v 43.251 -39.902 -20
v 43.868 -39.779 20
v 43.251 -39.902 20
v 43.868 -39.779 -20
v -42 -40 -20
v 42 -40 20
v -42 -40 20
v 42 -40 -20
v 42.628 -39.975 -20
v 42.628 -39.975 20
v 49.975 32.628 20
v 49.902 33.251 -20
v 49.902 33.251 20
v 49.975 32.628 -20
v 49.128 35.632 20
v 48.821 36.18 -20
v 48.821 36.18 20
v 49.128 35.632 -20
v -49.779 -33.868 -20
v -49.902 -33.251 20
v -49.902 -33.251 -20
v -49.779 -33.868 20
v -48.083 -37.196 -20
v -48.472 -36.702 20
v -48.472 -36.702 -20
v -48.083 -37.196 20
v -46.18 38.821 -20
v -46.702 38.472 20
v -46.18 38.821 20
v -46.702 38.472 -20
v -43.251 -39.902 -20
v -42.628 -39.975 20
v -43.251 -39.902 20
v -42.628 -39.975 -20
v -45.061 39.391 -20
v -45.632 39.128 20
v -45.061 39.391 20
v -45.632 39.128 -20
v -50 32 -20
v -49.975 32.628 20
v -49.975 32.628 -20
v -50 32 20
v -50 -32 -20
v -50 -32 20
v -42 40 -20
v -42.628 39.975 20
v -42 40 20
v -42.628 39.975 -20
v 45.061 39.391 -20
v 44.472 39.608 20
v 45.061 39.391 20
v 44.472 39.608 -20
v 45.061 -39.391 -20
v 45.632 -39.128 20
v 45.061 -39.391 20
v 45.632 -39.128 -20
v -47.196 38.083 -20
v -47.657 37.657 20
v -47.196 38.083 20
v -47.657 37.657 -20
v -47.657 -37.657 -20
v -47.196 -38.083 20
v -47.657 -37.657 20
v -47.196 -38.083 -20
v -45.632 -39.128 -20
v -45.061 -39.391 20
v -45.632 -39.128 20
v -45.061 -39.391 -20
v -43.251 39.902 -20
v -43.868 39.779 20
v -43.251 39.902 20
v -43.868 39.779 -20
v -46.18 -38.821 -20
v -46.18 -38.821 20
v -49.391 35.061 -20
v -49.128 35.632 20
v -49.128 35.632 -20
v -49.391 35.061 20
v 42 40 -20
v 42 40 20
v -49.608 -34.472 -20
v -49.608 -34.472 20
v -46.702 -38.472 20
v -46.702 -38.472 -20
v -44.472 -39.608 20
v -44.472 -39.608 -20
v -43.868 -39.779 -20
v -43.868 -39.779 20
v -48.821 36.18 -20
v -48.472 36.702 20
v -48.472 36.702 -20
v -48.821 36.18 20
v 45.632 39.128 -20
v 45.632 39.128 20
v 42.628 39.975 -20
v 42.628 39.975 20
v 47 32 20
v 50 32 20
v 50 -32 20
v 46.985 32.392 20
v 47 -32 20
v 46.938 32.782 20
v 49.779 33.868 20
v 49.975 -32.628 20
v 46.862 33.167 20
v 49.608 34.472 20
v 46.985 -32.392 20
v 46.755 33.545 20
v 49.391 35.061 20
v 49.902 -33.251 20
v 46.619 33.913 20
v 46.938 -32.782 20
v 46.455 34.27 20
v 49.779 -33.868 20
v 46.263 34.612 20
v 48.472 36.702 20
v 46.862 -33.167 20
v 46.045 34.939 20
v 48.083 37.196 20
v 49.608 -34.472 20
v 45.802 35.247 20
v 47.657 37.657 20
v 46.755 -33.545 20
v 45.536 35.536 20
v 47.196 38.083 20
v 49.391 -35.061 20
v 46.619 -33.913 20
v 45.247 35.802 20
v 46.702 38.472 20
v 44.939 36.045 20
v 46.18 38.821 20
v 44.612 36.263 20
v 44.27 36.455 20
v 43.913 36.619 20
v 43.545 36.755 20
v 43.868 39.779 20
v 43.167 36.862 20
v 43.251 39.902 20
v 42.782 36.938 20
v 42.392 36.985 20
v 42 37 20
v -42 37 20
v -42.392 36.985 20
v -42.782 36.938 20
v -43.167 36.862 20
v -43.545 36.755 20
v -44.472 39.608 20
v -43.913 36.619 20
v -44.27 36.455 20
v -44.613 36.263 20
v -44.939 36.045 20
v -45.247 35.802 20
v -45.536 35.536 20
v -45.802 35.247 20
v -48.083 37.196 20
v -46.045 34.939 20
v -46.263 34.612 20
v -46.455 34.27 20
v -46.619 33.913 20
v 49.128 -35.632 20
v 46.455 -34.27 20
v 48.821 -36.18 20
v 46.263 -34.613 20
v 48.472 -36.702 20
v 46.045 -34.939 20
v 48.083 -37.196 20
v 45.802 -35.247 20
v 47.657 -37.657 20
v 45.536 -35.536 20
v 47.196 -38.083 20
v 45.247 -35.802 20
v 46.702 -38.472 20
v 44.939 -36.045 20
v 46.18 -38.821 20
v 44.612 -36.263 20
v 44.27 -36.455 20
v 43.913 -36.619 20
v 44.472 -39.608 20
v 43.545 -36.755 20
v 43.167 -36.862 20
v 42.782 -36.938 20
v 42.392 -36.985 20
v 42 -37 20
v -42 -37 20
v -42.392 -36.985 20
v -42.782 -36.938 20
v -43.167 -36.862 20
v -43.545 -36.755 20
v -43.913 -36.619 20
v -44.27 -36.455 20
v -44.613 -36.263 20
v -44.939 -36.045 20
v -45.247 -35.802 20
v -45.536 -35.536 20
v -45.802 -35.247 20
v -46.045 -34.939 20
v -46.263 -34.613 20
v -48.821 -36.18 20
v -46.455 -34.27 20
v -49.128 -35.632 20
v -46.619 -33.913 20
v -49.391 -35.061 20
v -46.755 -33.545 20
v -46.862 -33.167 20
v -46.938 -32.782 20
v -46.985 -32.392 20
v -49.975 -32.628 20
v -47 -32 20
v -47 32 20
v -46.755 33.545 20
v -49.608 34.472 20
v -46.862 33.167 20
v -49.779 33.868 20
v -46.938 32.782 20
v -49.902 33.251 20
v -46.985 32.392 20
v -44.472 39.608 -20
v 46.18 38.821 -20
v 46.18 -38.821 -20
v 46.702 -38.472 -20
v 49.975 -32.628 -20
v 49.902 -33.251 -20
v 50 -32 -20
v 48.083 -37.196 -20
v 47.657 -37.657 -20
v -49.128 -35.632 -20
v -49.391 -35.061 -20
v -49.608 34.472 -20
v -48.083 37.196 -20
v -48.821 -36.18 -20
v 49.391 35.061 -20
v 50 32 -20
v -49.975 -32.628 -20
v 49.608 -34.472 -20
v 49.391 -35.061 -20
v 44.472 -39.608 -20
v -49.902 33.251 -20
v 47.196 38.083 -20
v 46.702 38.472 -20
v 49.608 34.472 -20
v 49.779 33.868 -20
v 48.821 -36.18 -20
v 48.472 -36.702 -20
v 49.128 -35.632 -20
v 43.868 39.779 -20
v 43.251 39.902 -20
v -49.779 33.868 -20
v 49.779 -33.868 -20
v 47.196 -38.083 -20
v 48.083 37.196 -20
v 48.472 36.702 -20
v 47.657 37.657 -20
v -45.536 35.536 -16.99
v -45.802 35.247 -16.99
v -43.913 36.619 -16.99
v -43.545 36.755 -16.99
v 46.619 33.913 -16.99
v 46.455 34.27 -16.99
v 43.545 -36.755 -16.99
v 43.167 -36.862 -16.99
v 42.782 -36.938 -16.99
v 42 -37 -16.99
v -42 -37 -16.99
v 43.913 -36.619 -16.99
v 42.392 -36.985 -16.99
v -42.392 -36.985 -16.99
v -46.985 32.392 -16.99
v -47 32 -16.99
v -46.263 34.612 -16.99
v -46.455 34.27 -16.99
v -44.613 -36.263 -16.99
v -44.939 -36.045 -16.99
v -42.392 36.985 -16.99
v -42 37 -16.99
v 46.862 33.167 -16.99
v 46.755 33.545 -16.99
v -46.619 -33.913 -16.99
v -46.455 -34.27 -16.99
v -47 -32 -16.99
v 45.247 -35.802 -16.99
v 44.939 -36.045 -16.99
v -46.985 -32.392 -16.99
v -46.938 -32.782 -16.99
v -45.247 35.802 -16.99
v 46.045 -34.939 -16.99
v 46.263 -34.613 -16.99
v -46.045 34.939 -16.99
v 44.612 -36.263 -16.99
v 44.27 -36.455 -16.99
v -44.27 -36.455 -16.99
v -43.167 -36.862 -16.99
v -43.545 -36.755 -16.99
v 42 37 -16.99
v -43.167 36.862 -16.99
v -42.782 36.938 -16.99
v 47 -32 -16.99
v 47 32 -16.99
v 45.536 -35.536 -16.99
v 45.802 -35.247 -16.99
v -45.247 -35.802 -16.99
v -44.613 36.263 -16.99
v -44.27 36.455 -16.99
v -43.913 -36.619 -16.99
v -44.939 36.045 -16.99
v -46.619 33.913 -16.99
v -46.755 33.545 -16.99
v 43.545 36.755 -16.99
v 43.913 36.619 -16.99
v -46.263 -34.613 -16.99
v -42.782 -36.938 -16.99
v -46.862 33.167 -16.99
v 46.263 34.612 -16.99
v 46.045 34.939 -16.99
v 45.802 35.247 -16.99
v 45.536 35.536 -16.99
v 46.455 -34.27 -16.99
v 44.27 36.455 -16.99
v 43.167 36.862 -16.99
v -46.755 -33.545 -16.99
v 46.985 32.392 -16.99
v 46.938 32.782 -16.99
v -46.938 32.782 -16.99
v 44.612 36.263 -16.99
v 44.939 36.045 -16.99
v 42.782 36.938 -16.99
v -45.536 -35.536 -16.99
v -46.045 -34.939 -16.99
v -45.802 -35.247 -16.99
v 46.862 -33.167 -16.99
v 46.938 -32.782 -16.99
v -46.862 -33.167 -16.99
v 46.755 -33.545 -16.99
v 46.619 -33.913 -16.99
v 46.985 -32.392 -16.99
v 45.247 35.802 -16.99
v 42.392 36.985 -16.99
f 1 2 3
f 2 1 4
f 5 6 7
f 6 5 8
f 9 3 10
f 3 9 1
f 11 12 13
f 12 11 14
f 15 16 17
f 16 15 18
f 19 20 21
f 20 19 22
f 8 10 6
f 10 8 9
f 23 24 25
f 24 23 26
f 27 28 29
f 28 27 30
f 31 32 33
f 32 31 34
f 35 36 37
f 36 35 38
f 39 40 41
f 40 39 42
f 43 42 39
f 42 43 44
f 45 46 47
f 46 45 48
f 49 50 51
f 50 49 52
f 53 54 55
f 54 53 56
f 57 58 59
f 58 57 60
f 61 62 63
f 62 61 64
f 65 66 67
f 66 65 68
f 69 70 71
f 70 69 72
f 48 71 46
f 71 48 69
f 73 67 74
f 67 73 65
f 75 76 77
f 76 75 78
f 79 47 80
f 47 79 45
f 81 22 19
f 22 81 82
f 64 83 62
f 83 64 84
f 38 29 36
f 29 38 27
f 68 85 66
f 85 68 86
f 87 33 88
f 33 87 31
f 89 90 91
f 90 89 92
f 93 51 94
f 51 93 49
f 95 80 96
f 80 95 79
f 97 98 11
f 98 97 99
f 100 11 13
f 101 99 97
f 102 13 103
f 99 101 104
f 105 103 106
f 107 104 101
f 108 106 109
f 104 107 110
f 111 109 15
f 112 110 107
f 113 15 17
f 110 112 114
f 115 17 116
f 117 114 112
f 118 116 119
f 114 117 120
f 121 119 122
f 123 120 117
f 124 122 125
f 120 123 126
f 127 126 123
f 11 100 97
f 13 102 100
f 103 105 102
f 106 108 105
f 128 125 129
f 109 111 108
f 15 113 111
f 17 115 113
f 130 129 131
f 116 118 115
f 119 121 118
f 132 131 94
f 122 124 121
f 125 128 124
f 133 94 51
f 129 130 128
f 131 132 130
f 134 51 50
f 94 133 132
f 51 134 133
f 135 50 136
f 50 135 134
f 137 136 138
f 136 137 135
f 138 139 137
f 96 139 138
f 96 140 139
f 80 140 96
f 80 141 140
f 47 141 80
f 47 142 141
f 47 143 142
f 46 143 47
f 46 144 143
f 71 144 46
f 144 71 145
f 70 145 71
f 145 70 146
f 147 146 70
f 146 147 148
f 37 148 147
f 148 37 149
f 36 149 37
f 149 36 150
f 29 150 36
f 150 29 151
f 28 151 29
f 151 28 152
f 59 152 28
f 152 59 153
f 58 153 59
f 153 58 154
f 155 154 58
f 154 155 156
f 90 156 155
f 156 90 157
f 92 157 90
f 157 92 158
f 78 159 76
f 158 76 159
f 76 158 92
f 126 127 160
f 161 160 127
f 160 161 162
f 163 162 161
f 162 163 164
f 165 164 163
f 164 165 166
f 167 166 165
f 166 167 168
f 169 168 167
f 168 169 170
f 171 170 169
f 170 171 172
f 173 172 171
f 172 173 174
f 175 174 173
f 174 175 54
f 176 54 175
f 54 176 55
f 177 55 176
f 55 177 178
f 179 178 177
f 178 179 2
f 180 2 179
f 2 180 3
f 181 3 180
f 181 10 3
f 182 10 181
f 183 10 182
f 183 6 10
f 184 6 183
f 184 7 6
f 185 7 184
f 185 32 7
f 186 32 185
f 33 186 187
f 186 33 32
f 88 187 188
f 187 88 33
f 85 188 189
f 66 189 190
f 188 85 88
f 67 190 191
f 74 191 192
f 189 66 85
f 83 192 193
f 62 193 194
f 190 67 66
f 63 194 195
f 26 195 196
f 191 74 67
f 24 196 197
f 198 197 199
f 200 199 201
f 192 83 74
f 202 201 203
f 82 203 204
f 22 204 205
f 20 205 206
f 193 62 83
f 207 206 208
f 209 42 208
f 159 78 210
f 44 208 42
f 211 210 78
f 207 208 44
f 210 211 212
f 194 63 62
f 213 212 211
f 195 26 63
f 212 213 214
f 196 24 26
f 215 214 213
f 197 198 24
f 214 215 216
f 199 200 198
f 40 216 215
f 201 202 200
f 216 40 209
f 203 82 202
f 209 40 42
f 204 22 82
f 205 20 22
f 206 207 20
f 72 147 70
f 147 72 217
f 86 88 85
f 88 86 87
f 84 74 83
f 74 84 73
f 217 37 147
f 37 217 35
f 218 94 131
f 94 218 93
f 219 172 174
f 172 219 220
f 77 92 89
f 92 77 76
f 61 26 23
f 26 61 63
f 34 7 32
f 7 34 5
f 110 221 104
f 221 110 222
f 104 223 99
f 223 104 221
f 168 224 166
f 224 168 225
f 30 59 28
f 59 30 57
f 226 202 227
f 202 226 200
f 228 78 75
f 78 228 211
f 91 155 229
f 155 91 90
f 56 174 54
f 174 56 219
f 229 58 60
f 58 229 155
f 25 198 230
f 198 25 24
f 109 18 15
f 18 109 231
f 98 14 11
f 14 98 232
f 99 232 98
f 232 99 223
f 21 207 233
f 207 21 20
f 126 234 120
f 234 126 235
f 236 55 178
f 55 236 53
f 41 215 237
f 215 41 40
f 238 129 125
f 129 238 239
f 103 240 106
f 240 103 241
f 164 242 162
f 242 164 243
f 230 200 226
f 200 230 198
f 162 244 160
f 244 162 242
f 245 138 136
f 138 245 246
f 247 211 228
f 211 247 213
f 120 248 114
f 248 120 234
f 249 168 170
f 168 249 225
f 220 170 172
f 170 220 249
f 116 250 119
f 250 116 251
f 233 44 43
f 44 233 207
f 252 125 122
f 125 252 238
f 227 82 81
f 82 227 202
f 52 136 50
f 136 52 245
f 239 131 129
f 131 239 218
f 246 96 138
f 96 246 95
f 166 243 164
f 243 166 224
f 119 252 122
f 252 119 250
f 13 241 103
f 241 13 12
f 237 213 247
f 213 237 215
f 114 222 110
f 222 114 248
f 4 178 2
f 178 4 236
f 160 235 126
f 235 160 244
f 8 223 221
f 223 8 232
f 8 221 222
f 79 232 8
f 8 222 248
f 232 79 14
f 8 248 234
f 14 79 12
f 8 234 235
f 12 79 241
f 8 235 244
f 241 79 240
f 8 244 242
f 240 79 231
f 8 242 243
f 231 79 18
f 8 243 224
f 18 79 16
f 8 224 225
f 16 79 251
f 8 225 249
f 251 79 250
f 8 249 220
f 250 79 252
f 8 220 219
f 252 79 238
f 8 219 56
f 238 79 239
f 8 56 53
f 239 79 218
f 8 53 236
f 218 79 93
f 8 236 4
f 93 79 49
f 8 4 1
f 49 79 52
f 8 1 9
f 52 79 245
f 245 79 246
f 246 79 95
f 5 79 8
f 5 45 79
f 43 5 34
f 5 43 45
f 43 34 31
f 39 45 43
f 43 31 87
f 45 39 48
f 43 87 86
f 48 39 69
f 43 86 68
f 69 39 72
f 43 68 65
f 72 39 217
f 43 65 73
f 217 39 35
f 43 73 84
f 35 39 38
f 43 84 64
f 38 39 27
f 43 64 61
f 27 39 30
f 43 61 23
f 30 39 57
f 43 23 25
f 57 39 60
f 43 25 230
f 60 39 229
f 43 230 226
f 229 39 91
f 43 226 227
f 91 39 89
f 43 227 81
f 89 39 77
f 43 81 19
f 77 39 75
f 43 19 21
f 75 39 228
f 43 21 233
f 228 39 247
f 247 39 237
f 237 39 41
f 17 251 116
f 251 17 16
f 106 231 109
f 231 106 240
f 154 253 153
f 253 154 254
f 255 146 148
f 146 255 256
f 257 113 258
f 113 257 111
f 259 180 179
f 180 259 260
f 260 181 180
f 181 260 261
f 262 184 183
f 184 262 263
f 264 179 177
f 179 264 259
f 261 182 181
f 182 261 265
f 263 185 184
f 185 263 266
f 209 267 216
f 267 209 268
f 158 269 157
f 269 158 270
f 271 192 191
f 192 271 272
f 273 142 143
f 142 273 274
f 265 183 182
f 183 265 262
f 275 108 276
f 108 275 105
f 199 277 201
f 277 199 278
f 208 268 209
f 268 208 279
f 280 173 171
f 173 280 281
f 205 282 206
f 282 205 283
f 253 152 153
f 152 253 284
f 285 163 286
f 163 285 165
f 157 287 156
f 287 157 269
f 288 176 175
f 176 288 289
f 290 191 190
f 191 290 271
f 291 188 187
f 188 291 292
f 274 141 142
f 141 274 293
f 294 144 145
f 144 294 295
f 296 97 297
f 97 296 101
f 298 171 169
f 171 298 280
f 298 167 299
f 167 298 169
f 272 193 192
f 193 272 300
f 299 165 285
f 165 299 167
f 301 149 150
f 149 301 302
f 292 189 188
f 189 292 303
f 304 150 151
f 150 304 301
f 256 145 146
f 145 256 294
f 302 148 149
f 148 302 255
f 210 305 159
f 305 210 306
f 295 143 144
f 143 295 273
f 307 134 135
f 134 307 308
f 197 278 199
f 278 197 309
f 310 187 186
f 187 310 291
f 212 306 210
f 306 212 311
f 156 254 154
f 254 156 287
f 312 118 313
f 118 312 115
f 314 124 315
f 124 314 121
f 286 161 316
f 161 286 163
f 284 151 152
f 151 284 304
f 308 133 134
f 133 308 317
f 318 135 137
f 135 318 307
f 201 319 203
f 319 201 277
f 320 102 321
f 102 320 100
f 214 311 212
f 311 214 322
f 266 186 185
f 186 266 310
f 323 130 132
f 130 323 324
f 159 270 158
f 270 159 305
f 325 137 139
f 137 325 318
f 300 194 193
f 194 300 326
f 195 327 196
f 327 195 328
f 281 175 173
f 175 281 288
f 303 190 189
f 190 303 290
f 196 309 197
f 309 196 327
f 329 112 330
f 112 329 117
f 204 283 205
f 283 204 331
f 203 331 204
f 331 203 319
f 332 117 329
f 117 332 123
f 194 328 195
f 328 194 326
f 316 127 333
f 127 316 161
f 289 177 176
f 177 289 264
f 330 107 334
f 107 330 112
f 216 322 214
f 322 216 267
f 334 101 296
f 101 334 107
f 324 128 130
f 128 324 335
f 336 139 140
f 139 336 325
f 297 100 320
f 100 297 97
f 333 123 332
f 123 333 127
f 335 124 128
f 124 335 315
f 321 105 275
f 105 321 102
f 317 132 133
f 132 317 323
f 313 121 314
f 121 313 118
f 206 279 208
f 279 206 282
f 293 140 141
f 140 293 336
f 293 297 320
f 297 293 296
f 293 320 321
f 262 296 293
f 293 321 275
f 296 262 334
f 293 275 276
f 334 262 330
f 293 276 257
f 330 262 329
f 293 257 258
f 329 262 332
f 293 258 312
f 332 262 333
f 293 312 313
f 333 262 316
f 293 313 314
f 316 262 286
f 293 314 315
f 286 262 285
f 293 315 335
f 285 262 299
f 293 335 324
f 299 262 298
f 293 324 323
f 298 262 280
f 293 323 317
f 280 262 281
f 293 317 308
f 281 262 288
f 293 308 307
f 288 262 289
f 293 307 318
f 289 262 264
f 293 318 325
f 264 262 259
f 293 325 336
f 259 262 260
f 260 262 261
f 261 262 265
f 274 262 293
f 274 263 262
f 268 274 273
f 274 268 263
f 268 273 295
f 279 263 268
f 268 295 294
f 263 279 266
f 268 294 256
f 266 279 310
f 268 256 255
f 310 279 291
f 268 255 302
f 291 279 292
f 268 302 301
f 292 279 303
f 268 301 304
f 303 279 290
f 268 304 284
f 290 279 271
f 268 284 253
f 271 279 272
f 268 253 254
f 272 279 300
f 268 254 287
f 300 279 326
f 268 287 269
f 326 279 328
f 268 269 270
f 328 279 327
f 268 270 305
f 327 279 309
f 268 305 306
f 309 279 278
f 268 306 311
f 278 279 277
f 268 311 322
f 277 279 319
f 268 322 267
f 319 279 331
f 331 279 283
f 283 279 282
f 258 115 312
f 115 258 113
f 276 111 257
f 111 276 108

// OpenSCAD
// Start: lazy_union
default_5_default_5();
// End: lazy_union

// Modules.

// 'PartMaterial undef-default - default 5.0'
module default_5_default_5() {
  // 'None : _combine_solids_and_holes'
  union() {
    // '_combine_solids_and_holes'
    difference() {
      // 'default : _combine_solids_and_holes'
      union() {
        // 'outer : _combine_solids_and_holes'
        union() {
          // 'hull'
          multmatrix(m=[[1.0, 0.0, 0.0, -50.0], [0.0, 1.0, 0.0, -40.0], [0.0, 0.0, 1.0, -20.0], [0.0, 0.0, 0.0, 1.0]]) {
            // 'hull : _combine_solids_and_holes'
            union() {
              // 'hull'
              linear_extrude(height=40.0, twist=0.0, slices=4, scale=[1.0, 1.0]) {
                polygon(points=[[8.0, 0.0], [92.0, 0.0], [92.62767276582277, 0.024661330134974513], [93.25147572032185, 0.09849327523889428], [93.86756291084724, 0.22104063681858133], [94.47213595499959, 0.39154786963876553], [95.06146745892073, 0.6089637399096981], [95.63192399791639, 0.8719478064930488], [96.1799885177276, 1.1788786851672537], [96.7022820183398, 1.5278640450004124], [97.19558438664149, 1.9167522751997437], [97.6568542494924, 2.3431457505076114], [98.08324772480026, 2.8044156133585236], [98.47213595499959, 3.297717981660207], [98.82112131483275, 3.8200114822724034], [99.12805219350696, 4.368076002083621], [99.3910362600903, 4.938532541079277], [99.60845213036124, 5.527864045000419], [99.77895936318143, 6.132437089152755], [99.90150672476112, 6.7485242796781515], [99.97533866986504, 7.37232723417724], [100.00000000000001, 8.0], [100.0, 72.0], [99.97533866986502, 72.62767276582277], [99.9015067247611, 73.25147572032185], [99.77895936318141, 73.86756291084724], [99.60845213036123, 74.47213595499957], [99.39103626009029, 75.06146745892072], [99.12805219350695, 75.63192399791637], [98.82112131483274, 76.17998851772758], [98.47213595499957, 76.70228201833977], [98.08324772480024, 77.19558438664146], [97.65685424949238, 77.65685424949237], [97.19558438664147, 78.08324772480023], [96.70228201833979, 78.47213595499957], [96.1799885177276, 78.82112131483272], [95.63192399791637, 79.12805219350693], [95.06146745892072, 79.39103626009027], [94.47213595499957, 79.60845213036121], [93.86756291084724, 79.77895936318139], [93.25147572032185, 79.90150672476108], [92.62767276582277, 79.975338669865], [92.0, 79.99999999999997], [8.0, 80.0], [7.37232723417724, 79.97533866986502], [6.748524279678152, 79.9015067247611], [6.132437089152757, 79.77895936318141], [5.52786404500042, 79.60845213036123], [4.938532541079281, 79.39103626009029], [4.368076002083625, 79.12805219350695], [3.8200114822724087, 78.82112131483274], [3.297717981660215, 78.47213595499957], [2.8044156133585307, 78.08324772480024], [2.3431457505076194, 77.65685424949238], [1.9167522751997517, 77.19558438664147], [1.5278640450004204, 76.70228201833979], [1.1788786851672617, 76.1799885177276], [0.8719478064930568, 75.63192399791637], [0.6089637399097052, 75.06146745892072], [0.39154786963877086, 74.47213595499959], [0.22104063681858666, 73.86756291084724], [0.09849327523889784, 73.25147572032185], [0.0246613301349754, 72.62767276582277], [-8.881784197001252e-16, 72.0], [0.0, 8.0], [0.02466133013497629, 7.372327234177241], [0.09849327523889784, 6.748524279678153], [0.22104063681858666, 6.1324370891527575], [0.39154786963877086, 5.527864045000421], [0.6089637399097052, 4.938532541079282], [0.8719478064930568, 4.368076002083626], [1.1788786851672617, 3.8200114822724105], [1.5278640450004204, 3.297717981660216], [1.9167522751997517, 2.8044156133585316], [2.3431457505076185, 2.3431457505076203], [2.8044156133585325, 1.9167522751997508], [3.297717981660214, 1.5278640450004213], [3.8200114822724114, 1.1788786851672608], [4.368076002083624, 0.8719478064930577], [4.938532541079277, 0.6089637399097079], [5.527864045000419, 0.39154786963877175], [6.132437089152758, 0.22104063681858666], [6.748524279678151, 0.09849327523889873], [7.372327234177234, 0.02466133013497629]]);
              }
            }
          }
        }
      }
      // 'default'
      multmatrix(m=[[1.0, 0.0, 0.0, 0.0], [0.0, 1.0, 0.0, 0.0], [0.0, 0.0, 1.0, 1.5100000000000016], [0.0, 0.0, 0.0, 1.0]]) {
        // 'inner : _combine_solids_and_holes'
        union() {
          // 'hull'
          multmatrix(m=[[1.0, 0.0, 0.0, -47.0], [0.0, 1.0, 0.0, -37.0], [0.0, 0.0, 1.0, -18.5], [0.0, 0.0, 0.0, 1.0]]) {
            // 'hull : _combine_solids_and_holes'
            union() {
              // 'hull'
              linear_extrude(height=37.0, twist=0.0, slices=4, scale=[1.0, 1.0]) {
                polygon(points=[[5.0, 0.0], [89.0, 0.0], [89.39229547863923, 0.015413331334361402], [89.78217232520116, 0.06155829702431337], [90.16722681927952, 0.13815039801161966], [90.54508497187473, 0.24471741852423534], [90.91341716182545, 0.38060233744356964], [91.26995249869773, 0.5449673790581651], [91.61249282357974, 0.7367991782295435], [91.93892626146236, 0.9549150281252681], [92.24724024165091, 1.1979701719998497], [92.53553390593274, 1.4644660940672671], [92.80202982800014, 1.7527597583490864], [93.04508497187473, 2.0610737385376385], [93.26320082177045, 2.387507176420259], [93.45503262094184, 2.7300475013022694], [93.61939766255642, 3.0865828381745546], [93.75528258147577, 3.4549150281252654], [93.86184960198838, 3.8327731807204746], [93.93844170297568, 4.217827674798847], [93.98458666866564, 4.607704521360776], [94.0, 5.0], [94.0, 69.0], [93.98458666866564, 69.39229547863923], [93.9384417029757, 69.78217232520116], [93.86184960198838, 70.16722681927953], [93.75528258147577, 70.54508497187474], [93.61939766255644, 70.91341716182545], [93.45503262094185, 71.26995249869775], [93.26320082177047, 71.61249282357976], [93.04508497187474, 71.93892626146237], [92.80202982800016, 72.24724024165093], [92.53553390593274, 72.53553390593275], [92.24724024165093, 72.80202982800017], [91.93892626146237, 73.04508497187476], [91.61249282357974, 73.26320082177048], [91.26995249869773, 73.45503262094186], [90.91341716182545, 73.61939766255645], [90.54508497187474, 73.7552825814758], [90.16722681927953, 73.86184960198841], [89.78217232520116, 73.93844170297571], [89.39229547863923, 73.98458666866567], [89.0, 74.00000000000003], [5.0, 74.0], [4.607704521360776, 73.98458666866564], [4.217827674798847, 73.9384417029757], [3.8327731807204746, 73.86184960198838], [3.4549150281252654, 73.75528258147577], [3.0865828381745537, 73.61939766255644], [2.730047501302269, 73.45503262094184], [2.3875071764202596, 73.26320082177045], [2.0610737385376394, 73.04508497187474], [1.7527597583490864, 72.80202982800016], [1.4644660940672685, 72.53553390593274], [1.1979701719998523, 72.24724024165091], [0.954915028125269, 71.93892626146237], [0.7367991782295471, 71.61249282357974], [0.5449673790581695, 71.26995249869773], [0.38060233744357586, 70.91341716182545], [0.24471741852424245, 70.54508497187474], [0.13815039801162854, 70.16722681927953], [0.06155829702432314, 69.78217232520116], [0.015413331334372948, 69.39229547863923], [1.4210854715202004e-14, 69.0], [0.0, 5.0], [0.015413331334360514, 4.607704521360776], [0.061558297024310704, 4.217827674798846], [0.138150398011617, 3.8327731807204737], [0.2447174185242318, 3.4549150281252636], [0.3806023374435661, 3.086582838174552], [0.5449673790581606, 2.7300475013022667], [0.7367991782295382, 2.3875071764202564], [0.9549150281252627, 2.061073738537635], [1.1979701719998448, 1.7527597583490824], [1.4644660940672614, 1.4644660940672627], [1.7527597583490828, 1.1979701719998443], [2.0610737385376336, 0.9549150281252636], [2.3875071764202573, 0.7367991782295382], [2.7300475013022654, 0.5449673790581606], [3.0865828381745484, 0.38060233744356786], [3.4549150281252623, 0.24471741852423268], [3.8327731807204746, 0.138150398011617], [4.217827674798845, 0.06155829702431159], [4.607704521360772, 0.015413331334360514]]);
              }
            }
          }
        }
      }
    }
  }
} // end module default_5_default_5
